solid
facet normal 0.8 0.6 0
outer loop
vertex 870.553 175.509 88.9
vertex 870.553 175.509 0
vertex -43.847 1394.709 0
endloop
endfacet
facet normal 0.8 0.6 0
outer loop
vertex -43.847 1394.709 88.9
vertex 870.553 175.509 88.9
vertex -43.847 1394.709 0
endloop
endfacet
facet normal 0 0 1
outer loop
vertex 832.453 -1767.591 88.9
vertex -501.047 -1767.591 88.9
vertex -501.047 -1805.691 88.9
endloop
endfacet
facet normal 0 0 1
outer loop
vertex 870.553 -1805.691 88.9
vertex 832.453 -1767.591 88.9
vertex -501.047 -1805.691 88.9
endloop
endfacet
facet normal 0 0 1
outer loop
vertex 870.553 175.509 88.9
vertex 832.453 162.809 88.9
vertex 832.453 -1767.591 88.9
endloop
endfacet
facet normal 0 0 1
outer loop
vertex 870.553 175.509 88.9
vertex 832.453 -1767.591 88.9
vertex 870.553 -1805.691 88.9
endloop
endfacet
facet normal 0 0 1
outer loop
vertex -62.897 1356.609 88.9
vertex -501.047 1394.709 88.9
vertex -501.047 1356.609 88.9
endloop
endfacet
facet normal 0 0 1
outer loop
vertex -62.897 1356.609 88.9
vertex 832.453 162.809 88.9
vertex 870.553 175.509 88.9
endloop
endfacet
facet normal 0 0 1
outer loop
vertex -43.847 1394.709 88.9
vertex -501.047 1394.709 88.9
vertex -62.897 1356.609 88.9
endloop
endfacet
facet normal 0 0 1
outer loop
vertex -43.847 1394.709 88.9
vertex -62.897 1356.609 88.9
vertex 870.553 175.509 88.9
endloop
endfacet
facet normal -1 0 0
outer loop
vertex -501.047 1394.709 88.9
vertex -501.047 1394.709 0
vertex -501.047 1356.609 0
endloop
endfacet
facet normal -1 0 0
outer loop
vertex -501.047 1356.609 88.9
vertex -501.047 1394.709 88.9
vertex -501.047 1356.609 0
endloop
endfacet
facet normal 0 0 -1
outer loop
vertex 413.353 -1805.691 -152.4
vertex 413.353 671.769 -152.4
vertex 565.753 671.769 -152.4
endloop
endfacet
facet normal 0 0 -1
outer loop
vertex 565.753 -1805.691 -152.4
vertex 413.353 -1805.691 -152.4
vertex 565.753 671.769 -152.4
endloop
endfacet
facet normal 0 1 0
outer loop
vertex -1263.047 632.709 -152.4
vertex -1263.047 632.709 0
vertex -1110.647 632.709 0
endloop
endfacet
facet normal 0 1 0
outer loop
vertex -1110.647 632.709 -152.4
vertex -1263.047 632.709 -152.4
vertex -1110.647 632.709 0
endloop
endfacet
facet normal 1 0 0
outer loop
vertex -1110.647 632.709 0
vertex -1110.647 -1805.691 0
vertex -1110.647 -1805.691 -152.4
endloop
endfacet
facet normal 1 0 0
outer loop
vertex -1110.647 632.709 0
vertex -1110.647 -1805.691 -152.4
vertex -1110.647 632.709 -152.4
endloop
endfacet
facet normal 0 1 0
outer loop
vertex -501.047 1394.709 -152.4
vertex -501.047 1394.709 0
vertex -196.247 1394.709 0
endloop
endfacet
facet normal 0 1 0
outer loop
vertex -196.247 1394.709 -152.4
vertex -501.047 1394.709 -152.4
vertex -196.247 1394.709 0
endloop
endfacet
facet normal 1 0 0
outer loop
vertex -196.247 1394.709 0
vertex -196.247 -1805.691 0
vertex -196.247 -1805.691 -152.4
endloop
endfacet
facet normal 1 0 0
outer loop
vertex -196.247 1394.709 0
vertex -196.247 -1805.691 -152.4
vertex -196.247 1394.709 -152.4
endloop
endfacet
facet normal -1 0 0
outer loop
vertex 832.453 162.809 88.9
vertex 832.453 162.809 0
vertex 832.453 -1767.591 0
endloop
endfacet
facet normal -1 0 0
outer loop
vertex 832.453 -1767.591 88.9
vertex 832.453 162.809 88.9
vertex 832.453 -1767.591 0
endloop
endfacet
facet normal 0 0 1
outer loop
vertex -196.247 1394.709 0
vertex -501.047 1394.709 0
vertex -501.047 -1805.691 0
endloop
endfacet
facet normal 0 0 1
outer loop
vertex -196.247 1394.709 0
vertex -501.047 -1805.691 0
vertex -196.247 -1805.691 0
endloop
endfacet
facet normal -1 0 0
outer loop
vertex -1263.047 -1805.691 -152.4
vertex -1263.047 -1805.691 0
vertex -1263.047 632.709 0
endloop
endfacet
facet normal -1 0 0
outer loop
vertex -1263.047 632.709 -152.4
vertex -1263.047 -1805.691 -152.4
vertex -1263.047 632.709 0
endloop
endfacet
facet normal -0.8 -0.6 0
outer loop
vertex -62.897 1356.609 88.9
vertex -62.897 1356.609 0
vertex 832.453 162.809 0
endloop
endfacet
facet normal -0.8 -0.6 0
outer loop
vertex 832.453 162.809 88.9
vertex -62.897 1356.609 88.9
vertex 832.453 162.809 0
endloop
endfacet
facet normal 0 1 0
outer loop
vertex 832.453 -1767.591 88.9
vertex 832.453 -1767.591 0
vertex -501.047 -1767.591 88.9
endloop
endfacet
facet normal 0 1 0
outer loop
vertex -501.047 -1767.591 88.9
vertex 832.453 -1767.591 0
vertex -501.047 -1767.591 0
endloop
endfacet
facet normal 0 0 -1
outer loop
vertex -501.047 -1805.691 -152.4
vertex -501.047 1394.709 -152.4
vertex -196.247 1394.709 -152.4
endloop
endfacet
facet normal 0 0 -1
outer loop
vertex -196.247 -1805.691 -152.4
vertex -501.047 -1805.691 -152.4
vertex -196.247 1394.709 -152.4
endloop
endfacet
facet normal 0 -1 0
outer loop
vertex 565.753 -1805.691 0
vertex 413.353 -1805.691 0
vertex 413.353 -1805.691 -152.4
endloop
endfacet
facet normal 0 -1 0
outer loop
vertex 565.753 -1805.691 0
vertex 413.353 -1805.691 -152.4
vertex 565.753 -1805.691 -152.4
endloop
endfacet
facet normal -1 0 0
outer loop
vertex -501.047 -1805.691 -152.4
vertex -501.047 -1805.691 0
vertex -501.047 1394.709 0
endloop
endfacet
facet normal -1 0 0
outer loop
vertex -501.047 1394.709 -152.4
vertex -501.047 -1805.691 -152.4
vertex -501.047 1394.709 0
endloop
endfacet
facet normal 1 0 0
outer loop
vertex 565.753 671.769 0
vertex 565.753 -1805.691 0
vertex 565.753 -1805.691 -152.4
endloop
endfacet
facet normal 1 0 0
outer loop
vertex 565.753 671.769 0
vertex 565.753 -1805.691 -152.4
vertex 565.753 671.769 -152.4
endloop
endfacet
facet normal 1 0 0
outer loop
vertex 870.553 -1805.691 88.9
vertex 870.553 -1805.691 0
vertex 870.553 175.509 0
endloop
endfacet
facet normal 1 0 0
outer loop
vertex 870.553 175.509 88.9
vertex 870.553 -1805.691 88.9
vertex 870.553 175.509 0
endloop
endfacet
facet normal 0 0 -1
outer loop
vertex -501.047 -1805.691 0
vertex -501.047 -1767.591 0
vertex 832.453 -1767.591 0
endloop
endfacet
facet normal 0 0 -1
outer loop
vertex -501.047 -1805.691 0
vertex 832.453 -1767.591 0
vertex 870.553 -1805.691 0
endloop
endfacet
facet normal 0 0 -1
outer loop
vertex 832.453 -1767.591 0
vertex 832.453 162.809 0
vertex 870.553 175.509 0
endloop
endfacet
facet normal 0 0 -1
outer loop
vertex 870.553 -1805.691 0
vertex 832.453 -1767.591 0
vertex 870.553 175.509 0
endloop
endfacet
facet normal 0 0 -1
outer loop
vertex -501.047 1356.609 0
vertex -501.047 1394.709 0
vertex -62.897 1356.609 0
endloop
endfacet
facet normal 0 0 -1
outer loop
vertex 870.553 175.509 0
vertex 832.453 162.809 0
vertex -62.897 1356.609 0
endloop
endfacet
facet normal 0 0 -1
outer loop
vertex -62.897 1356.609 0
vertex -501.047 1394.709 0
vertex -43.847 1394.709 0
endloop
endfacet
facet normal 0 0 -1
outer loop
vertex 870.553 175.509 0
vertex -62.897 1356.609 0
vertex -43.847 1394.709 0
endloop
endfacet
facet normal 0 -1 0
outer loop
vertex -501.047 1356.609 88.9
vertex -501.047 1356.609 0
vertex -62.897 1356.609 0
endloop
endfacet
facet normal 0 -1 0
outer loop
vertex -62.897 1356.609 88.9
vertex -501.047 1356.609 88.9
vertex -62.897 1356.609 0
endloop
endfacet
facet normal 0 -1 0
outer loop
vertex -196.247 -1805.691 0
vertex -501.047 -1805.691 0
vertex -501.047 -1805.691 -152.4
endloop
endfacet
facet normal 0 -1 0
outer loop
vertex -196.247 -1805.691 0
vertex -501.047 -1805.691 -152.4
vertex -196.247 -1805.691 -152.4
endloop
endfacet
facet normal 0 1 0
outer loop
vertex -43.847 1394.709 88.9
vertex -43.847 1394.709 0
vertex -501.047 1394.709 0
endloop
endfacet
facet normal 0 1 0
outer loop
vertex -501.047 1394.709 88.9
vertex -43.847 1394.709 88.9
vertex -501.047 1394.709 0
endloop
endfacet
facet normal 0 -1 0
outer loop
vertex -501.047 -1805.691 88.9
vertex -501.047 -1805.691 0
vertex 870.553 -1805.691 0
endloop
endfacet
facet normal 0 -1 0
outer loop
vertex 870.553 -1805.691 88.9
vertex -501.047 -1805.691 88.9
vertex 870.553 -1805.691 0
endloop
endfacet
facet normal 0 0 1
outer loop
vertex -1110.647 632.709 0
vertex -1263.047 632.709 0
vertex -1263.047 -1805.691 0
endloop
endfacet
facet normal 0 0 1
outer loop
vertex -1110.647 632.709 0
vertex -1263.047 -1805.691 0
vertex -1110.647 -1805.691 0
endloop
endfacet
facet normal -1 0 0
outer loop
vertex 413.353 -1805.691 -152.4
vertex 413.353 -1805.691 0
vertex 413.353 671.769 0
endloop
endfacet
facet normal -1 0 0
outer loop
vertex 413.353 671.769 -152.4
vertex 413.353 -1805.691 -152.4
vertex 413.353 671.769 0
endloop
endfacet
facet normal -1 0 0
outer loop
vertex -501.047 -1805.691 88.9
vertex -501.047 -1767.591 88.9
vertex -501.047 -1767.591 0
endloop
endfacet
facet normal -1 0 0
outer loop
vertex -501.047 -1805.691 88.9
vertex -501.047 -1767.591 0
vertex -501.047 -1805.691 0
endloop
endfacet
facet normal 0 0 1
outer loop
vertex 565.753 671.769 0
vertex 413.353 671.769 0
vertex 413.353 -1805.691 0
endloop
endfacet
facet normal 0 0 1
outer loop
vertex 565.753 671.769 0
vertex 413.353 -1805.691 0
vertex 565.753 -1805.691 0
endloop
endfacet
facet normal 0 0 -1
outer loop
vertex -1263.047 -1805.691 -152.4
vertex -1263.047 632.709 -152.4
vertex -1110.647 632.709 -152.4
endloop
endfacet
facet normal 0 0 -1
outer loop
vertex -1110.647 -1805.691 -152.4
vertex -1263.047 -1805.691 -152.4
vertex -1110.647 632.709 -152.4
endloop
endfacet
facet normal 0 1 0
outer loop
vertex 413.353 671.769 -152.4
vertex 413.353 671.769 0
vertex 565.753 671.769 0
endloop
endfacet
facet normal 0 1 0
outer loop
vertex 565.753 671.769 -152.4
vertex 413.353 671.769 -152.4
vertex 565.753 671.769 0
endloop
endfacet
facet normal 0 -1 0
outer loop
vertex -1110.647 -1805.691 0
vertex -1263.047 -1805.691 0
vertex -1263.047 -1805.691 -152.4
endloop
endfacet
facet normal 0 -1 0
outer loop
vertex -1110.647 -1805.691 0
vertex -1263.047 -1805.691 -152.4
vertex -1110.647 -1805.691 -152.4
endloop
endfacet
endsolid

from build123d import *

# Parameters (mm, degrees)
F0_W     = 304.8
F0_H     = 3200.4
F1_DEPTH = 152.4
F0_W_2   = 152.4
F0_H_2   = 2438.4
F0_H_3   = 2477.460205555
F3_DEPTH = 88.9


with BuildPart() as f1:
    # F0 (on Top) → F1 (new body)
    with BuildSketch(Plane.XY):
        with Locations((-348.6470991135, -205.491242218)):
            Rectangle(F0_W, F0_H)
    extrude(amount=-F1_DEPTH)


with BuildPart() as f1b:
    # F0 (on Top) → F1, piece 2 (new body)
    with BuildSketch(Plane.XY):
        with Locations((-1186.8470991135, -586.491242218)):
            Rectangle(F0_W_2, F0_H_2)
    extrude(amount=-F1_DEPTH)


with BuildPart() as f1c:
    # F0 (on Top) → F1, piece 3 (new body)
    with BuildSketch(Plane.XY):
        with Locations((489.5529008865, -566.9611394405)):
            Rectangle(F0_W_2, F0_H_3)
    extrude(amount=-F1_DEPTH)


with BuildPart() as f3:
    # F2 (on face) → F3 (new body)
    with BuildSketch(Plane.XY):
        Polygon((-501.0470991135, -1805.691242218), (-348.6470991135, -1805.691242218), (-196.2470991135, -1805.691242218), (-196.2470991135, -1767.591242218), (-348.6470991135, -1767.591242218), (-501.0470991135, -1767.591242218), align=None)
        Polygon((-196.2470991135, -1767.591242218), (-196.2470991135, -1805.691242218), (870.5529008865, -1805.691242218), (870.5529008865, 175.508757782), (-43.8470991135, 1394.708757782), (-196.2470991135, 1394.708757782), (-196.2470991135, 1356.608757782), (-62.8970991135, 1356.608757782), (832.4529008865, 162.808757782), (832.4529008865, -1767.591242218), align=None)
        Polygon((-348.6470991135, 1356.608757782), (-196.2470991135, 1356.608757782), (-196.2470991135, 1394.708757782), (-348.6470991135, 1394.708757782), (-501.0470991135, 1394.708757782), (-501.0470991135, 1356.608757782), align=None)
    extrude(amount=F3_DEPTH)


solid = Compound([f1.part, f1b.part, f1c.part, f3.part])
